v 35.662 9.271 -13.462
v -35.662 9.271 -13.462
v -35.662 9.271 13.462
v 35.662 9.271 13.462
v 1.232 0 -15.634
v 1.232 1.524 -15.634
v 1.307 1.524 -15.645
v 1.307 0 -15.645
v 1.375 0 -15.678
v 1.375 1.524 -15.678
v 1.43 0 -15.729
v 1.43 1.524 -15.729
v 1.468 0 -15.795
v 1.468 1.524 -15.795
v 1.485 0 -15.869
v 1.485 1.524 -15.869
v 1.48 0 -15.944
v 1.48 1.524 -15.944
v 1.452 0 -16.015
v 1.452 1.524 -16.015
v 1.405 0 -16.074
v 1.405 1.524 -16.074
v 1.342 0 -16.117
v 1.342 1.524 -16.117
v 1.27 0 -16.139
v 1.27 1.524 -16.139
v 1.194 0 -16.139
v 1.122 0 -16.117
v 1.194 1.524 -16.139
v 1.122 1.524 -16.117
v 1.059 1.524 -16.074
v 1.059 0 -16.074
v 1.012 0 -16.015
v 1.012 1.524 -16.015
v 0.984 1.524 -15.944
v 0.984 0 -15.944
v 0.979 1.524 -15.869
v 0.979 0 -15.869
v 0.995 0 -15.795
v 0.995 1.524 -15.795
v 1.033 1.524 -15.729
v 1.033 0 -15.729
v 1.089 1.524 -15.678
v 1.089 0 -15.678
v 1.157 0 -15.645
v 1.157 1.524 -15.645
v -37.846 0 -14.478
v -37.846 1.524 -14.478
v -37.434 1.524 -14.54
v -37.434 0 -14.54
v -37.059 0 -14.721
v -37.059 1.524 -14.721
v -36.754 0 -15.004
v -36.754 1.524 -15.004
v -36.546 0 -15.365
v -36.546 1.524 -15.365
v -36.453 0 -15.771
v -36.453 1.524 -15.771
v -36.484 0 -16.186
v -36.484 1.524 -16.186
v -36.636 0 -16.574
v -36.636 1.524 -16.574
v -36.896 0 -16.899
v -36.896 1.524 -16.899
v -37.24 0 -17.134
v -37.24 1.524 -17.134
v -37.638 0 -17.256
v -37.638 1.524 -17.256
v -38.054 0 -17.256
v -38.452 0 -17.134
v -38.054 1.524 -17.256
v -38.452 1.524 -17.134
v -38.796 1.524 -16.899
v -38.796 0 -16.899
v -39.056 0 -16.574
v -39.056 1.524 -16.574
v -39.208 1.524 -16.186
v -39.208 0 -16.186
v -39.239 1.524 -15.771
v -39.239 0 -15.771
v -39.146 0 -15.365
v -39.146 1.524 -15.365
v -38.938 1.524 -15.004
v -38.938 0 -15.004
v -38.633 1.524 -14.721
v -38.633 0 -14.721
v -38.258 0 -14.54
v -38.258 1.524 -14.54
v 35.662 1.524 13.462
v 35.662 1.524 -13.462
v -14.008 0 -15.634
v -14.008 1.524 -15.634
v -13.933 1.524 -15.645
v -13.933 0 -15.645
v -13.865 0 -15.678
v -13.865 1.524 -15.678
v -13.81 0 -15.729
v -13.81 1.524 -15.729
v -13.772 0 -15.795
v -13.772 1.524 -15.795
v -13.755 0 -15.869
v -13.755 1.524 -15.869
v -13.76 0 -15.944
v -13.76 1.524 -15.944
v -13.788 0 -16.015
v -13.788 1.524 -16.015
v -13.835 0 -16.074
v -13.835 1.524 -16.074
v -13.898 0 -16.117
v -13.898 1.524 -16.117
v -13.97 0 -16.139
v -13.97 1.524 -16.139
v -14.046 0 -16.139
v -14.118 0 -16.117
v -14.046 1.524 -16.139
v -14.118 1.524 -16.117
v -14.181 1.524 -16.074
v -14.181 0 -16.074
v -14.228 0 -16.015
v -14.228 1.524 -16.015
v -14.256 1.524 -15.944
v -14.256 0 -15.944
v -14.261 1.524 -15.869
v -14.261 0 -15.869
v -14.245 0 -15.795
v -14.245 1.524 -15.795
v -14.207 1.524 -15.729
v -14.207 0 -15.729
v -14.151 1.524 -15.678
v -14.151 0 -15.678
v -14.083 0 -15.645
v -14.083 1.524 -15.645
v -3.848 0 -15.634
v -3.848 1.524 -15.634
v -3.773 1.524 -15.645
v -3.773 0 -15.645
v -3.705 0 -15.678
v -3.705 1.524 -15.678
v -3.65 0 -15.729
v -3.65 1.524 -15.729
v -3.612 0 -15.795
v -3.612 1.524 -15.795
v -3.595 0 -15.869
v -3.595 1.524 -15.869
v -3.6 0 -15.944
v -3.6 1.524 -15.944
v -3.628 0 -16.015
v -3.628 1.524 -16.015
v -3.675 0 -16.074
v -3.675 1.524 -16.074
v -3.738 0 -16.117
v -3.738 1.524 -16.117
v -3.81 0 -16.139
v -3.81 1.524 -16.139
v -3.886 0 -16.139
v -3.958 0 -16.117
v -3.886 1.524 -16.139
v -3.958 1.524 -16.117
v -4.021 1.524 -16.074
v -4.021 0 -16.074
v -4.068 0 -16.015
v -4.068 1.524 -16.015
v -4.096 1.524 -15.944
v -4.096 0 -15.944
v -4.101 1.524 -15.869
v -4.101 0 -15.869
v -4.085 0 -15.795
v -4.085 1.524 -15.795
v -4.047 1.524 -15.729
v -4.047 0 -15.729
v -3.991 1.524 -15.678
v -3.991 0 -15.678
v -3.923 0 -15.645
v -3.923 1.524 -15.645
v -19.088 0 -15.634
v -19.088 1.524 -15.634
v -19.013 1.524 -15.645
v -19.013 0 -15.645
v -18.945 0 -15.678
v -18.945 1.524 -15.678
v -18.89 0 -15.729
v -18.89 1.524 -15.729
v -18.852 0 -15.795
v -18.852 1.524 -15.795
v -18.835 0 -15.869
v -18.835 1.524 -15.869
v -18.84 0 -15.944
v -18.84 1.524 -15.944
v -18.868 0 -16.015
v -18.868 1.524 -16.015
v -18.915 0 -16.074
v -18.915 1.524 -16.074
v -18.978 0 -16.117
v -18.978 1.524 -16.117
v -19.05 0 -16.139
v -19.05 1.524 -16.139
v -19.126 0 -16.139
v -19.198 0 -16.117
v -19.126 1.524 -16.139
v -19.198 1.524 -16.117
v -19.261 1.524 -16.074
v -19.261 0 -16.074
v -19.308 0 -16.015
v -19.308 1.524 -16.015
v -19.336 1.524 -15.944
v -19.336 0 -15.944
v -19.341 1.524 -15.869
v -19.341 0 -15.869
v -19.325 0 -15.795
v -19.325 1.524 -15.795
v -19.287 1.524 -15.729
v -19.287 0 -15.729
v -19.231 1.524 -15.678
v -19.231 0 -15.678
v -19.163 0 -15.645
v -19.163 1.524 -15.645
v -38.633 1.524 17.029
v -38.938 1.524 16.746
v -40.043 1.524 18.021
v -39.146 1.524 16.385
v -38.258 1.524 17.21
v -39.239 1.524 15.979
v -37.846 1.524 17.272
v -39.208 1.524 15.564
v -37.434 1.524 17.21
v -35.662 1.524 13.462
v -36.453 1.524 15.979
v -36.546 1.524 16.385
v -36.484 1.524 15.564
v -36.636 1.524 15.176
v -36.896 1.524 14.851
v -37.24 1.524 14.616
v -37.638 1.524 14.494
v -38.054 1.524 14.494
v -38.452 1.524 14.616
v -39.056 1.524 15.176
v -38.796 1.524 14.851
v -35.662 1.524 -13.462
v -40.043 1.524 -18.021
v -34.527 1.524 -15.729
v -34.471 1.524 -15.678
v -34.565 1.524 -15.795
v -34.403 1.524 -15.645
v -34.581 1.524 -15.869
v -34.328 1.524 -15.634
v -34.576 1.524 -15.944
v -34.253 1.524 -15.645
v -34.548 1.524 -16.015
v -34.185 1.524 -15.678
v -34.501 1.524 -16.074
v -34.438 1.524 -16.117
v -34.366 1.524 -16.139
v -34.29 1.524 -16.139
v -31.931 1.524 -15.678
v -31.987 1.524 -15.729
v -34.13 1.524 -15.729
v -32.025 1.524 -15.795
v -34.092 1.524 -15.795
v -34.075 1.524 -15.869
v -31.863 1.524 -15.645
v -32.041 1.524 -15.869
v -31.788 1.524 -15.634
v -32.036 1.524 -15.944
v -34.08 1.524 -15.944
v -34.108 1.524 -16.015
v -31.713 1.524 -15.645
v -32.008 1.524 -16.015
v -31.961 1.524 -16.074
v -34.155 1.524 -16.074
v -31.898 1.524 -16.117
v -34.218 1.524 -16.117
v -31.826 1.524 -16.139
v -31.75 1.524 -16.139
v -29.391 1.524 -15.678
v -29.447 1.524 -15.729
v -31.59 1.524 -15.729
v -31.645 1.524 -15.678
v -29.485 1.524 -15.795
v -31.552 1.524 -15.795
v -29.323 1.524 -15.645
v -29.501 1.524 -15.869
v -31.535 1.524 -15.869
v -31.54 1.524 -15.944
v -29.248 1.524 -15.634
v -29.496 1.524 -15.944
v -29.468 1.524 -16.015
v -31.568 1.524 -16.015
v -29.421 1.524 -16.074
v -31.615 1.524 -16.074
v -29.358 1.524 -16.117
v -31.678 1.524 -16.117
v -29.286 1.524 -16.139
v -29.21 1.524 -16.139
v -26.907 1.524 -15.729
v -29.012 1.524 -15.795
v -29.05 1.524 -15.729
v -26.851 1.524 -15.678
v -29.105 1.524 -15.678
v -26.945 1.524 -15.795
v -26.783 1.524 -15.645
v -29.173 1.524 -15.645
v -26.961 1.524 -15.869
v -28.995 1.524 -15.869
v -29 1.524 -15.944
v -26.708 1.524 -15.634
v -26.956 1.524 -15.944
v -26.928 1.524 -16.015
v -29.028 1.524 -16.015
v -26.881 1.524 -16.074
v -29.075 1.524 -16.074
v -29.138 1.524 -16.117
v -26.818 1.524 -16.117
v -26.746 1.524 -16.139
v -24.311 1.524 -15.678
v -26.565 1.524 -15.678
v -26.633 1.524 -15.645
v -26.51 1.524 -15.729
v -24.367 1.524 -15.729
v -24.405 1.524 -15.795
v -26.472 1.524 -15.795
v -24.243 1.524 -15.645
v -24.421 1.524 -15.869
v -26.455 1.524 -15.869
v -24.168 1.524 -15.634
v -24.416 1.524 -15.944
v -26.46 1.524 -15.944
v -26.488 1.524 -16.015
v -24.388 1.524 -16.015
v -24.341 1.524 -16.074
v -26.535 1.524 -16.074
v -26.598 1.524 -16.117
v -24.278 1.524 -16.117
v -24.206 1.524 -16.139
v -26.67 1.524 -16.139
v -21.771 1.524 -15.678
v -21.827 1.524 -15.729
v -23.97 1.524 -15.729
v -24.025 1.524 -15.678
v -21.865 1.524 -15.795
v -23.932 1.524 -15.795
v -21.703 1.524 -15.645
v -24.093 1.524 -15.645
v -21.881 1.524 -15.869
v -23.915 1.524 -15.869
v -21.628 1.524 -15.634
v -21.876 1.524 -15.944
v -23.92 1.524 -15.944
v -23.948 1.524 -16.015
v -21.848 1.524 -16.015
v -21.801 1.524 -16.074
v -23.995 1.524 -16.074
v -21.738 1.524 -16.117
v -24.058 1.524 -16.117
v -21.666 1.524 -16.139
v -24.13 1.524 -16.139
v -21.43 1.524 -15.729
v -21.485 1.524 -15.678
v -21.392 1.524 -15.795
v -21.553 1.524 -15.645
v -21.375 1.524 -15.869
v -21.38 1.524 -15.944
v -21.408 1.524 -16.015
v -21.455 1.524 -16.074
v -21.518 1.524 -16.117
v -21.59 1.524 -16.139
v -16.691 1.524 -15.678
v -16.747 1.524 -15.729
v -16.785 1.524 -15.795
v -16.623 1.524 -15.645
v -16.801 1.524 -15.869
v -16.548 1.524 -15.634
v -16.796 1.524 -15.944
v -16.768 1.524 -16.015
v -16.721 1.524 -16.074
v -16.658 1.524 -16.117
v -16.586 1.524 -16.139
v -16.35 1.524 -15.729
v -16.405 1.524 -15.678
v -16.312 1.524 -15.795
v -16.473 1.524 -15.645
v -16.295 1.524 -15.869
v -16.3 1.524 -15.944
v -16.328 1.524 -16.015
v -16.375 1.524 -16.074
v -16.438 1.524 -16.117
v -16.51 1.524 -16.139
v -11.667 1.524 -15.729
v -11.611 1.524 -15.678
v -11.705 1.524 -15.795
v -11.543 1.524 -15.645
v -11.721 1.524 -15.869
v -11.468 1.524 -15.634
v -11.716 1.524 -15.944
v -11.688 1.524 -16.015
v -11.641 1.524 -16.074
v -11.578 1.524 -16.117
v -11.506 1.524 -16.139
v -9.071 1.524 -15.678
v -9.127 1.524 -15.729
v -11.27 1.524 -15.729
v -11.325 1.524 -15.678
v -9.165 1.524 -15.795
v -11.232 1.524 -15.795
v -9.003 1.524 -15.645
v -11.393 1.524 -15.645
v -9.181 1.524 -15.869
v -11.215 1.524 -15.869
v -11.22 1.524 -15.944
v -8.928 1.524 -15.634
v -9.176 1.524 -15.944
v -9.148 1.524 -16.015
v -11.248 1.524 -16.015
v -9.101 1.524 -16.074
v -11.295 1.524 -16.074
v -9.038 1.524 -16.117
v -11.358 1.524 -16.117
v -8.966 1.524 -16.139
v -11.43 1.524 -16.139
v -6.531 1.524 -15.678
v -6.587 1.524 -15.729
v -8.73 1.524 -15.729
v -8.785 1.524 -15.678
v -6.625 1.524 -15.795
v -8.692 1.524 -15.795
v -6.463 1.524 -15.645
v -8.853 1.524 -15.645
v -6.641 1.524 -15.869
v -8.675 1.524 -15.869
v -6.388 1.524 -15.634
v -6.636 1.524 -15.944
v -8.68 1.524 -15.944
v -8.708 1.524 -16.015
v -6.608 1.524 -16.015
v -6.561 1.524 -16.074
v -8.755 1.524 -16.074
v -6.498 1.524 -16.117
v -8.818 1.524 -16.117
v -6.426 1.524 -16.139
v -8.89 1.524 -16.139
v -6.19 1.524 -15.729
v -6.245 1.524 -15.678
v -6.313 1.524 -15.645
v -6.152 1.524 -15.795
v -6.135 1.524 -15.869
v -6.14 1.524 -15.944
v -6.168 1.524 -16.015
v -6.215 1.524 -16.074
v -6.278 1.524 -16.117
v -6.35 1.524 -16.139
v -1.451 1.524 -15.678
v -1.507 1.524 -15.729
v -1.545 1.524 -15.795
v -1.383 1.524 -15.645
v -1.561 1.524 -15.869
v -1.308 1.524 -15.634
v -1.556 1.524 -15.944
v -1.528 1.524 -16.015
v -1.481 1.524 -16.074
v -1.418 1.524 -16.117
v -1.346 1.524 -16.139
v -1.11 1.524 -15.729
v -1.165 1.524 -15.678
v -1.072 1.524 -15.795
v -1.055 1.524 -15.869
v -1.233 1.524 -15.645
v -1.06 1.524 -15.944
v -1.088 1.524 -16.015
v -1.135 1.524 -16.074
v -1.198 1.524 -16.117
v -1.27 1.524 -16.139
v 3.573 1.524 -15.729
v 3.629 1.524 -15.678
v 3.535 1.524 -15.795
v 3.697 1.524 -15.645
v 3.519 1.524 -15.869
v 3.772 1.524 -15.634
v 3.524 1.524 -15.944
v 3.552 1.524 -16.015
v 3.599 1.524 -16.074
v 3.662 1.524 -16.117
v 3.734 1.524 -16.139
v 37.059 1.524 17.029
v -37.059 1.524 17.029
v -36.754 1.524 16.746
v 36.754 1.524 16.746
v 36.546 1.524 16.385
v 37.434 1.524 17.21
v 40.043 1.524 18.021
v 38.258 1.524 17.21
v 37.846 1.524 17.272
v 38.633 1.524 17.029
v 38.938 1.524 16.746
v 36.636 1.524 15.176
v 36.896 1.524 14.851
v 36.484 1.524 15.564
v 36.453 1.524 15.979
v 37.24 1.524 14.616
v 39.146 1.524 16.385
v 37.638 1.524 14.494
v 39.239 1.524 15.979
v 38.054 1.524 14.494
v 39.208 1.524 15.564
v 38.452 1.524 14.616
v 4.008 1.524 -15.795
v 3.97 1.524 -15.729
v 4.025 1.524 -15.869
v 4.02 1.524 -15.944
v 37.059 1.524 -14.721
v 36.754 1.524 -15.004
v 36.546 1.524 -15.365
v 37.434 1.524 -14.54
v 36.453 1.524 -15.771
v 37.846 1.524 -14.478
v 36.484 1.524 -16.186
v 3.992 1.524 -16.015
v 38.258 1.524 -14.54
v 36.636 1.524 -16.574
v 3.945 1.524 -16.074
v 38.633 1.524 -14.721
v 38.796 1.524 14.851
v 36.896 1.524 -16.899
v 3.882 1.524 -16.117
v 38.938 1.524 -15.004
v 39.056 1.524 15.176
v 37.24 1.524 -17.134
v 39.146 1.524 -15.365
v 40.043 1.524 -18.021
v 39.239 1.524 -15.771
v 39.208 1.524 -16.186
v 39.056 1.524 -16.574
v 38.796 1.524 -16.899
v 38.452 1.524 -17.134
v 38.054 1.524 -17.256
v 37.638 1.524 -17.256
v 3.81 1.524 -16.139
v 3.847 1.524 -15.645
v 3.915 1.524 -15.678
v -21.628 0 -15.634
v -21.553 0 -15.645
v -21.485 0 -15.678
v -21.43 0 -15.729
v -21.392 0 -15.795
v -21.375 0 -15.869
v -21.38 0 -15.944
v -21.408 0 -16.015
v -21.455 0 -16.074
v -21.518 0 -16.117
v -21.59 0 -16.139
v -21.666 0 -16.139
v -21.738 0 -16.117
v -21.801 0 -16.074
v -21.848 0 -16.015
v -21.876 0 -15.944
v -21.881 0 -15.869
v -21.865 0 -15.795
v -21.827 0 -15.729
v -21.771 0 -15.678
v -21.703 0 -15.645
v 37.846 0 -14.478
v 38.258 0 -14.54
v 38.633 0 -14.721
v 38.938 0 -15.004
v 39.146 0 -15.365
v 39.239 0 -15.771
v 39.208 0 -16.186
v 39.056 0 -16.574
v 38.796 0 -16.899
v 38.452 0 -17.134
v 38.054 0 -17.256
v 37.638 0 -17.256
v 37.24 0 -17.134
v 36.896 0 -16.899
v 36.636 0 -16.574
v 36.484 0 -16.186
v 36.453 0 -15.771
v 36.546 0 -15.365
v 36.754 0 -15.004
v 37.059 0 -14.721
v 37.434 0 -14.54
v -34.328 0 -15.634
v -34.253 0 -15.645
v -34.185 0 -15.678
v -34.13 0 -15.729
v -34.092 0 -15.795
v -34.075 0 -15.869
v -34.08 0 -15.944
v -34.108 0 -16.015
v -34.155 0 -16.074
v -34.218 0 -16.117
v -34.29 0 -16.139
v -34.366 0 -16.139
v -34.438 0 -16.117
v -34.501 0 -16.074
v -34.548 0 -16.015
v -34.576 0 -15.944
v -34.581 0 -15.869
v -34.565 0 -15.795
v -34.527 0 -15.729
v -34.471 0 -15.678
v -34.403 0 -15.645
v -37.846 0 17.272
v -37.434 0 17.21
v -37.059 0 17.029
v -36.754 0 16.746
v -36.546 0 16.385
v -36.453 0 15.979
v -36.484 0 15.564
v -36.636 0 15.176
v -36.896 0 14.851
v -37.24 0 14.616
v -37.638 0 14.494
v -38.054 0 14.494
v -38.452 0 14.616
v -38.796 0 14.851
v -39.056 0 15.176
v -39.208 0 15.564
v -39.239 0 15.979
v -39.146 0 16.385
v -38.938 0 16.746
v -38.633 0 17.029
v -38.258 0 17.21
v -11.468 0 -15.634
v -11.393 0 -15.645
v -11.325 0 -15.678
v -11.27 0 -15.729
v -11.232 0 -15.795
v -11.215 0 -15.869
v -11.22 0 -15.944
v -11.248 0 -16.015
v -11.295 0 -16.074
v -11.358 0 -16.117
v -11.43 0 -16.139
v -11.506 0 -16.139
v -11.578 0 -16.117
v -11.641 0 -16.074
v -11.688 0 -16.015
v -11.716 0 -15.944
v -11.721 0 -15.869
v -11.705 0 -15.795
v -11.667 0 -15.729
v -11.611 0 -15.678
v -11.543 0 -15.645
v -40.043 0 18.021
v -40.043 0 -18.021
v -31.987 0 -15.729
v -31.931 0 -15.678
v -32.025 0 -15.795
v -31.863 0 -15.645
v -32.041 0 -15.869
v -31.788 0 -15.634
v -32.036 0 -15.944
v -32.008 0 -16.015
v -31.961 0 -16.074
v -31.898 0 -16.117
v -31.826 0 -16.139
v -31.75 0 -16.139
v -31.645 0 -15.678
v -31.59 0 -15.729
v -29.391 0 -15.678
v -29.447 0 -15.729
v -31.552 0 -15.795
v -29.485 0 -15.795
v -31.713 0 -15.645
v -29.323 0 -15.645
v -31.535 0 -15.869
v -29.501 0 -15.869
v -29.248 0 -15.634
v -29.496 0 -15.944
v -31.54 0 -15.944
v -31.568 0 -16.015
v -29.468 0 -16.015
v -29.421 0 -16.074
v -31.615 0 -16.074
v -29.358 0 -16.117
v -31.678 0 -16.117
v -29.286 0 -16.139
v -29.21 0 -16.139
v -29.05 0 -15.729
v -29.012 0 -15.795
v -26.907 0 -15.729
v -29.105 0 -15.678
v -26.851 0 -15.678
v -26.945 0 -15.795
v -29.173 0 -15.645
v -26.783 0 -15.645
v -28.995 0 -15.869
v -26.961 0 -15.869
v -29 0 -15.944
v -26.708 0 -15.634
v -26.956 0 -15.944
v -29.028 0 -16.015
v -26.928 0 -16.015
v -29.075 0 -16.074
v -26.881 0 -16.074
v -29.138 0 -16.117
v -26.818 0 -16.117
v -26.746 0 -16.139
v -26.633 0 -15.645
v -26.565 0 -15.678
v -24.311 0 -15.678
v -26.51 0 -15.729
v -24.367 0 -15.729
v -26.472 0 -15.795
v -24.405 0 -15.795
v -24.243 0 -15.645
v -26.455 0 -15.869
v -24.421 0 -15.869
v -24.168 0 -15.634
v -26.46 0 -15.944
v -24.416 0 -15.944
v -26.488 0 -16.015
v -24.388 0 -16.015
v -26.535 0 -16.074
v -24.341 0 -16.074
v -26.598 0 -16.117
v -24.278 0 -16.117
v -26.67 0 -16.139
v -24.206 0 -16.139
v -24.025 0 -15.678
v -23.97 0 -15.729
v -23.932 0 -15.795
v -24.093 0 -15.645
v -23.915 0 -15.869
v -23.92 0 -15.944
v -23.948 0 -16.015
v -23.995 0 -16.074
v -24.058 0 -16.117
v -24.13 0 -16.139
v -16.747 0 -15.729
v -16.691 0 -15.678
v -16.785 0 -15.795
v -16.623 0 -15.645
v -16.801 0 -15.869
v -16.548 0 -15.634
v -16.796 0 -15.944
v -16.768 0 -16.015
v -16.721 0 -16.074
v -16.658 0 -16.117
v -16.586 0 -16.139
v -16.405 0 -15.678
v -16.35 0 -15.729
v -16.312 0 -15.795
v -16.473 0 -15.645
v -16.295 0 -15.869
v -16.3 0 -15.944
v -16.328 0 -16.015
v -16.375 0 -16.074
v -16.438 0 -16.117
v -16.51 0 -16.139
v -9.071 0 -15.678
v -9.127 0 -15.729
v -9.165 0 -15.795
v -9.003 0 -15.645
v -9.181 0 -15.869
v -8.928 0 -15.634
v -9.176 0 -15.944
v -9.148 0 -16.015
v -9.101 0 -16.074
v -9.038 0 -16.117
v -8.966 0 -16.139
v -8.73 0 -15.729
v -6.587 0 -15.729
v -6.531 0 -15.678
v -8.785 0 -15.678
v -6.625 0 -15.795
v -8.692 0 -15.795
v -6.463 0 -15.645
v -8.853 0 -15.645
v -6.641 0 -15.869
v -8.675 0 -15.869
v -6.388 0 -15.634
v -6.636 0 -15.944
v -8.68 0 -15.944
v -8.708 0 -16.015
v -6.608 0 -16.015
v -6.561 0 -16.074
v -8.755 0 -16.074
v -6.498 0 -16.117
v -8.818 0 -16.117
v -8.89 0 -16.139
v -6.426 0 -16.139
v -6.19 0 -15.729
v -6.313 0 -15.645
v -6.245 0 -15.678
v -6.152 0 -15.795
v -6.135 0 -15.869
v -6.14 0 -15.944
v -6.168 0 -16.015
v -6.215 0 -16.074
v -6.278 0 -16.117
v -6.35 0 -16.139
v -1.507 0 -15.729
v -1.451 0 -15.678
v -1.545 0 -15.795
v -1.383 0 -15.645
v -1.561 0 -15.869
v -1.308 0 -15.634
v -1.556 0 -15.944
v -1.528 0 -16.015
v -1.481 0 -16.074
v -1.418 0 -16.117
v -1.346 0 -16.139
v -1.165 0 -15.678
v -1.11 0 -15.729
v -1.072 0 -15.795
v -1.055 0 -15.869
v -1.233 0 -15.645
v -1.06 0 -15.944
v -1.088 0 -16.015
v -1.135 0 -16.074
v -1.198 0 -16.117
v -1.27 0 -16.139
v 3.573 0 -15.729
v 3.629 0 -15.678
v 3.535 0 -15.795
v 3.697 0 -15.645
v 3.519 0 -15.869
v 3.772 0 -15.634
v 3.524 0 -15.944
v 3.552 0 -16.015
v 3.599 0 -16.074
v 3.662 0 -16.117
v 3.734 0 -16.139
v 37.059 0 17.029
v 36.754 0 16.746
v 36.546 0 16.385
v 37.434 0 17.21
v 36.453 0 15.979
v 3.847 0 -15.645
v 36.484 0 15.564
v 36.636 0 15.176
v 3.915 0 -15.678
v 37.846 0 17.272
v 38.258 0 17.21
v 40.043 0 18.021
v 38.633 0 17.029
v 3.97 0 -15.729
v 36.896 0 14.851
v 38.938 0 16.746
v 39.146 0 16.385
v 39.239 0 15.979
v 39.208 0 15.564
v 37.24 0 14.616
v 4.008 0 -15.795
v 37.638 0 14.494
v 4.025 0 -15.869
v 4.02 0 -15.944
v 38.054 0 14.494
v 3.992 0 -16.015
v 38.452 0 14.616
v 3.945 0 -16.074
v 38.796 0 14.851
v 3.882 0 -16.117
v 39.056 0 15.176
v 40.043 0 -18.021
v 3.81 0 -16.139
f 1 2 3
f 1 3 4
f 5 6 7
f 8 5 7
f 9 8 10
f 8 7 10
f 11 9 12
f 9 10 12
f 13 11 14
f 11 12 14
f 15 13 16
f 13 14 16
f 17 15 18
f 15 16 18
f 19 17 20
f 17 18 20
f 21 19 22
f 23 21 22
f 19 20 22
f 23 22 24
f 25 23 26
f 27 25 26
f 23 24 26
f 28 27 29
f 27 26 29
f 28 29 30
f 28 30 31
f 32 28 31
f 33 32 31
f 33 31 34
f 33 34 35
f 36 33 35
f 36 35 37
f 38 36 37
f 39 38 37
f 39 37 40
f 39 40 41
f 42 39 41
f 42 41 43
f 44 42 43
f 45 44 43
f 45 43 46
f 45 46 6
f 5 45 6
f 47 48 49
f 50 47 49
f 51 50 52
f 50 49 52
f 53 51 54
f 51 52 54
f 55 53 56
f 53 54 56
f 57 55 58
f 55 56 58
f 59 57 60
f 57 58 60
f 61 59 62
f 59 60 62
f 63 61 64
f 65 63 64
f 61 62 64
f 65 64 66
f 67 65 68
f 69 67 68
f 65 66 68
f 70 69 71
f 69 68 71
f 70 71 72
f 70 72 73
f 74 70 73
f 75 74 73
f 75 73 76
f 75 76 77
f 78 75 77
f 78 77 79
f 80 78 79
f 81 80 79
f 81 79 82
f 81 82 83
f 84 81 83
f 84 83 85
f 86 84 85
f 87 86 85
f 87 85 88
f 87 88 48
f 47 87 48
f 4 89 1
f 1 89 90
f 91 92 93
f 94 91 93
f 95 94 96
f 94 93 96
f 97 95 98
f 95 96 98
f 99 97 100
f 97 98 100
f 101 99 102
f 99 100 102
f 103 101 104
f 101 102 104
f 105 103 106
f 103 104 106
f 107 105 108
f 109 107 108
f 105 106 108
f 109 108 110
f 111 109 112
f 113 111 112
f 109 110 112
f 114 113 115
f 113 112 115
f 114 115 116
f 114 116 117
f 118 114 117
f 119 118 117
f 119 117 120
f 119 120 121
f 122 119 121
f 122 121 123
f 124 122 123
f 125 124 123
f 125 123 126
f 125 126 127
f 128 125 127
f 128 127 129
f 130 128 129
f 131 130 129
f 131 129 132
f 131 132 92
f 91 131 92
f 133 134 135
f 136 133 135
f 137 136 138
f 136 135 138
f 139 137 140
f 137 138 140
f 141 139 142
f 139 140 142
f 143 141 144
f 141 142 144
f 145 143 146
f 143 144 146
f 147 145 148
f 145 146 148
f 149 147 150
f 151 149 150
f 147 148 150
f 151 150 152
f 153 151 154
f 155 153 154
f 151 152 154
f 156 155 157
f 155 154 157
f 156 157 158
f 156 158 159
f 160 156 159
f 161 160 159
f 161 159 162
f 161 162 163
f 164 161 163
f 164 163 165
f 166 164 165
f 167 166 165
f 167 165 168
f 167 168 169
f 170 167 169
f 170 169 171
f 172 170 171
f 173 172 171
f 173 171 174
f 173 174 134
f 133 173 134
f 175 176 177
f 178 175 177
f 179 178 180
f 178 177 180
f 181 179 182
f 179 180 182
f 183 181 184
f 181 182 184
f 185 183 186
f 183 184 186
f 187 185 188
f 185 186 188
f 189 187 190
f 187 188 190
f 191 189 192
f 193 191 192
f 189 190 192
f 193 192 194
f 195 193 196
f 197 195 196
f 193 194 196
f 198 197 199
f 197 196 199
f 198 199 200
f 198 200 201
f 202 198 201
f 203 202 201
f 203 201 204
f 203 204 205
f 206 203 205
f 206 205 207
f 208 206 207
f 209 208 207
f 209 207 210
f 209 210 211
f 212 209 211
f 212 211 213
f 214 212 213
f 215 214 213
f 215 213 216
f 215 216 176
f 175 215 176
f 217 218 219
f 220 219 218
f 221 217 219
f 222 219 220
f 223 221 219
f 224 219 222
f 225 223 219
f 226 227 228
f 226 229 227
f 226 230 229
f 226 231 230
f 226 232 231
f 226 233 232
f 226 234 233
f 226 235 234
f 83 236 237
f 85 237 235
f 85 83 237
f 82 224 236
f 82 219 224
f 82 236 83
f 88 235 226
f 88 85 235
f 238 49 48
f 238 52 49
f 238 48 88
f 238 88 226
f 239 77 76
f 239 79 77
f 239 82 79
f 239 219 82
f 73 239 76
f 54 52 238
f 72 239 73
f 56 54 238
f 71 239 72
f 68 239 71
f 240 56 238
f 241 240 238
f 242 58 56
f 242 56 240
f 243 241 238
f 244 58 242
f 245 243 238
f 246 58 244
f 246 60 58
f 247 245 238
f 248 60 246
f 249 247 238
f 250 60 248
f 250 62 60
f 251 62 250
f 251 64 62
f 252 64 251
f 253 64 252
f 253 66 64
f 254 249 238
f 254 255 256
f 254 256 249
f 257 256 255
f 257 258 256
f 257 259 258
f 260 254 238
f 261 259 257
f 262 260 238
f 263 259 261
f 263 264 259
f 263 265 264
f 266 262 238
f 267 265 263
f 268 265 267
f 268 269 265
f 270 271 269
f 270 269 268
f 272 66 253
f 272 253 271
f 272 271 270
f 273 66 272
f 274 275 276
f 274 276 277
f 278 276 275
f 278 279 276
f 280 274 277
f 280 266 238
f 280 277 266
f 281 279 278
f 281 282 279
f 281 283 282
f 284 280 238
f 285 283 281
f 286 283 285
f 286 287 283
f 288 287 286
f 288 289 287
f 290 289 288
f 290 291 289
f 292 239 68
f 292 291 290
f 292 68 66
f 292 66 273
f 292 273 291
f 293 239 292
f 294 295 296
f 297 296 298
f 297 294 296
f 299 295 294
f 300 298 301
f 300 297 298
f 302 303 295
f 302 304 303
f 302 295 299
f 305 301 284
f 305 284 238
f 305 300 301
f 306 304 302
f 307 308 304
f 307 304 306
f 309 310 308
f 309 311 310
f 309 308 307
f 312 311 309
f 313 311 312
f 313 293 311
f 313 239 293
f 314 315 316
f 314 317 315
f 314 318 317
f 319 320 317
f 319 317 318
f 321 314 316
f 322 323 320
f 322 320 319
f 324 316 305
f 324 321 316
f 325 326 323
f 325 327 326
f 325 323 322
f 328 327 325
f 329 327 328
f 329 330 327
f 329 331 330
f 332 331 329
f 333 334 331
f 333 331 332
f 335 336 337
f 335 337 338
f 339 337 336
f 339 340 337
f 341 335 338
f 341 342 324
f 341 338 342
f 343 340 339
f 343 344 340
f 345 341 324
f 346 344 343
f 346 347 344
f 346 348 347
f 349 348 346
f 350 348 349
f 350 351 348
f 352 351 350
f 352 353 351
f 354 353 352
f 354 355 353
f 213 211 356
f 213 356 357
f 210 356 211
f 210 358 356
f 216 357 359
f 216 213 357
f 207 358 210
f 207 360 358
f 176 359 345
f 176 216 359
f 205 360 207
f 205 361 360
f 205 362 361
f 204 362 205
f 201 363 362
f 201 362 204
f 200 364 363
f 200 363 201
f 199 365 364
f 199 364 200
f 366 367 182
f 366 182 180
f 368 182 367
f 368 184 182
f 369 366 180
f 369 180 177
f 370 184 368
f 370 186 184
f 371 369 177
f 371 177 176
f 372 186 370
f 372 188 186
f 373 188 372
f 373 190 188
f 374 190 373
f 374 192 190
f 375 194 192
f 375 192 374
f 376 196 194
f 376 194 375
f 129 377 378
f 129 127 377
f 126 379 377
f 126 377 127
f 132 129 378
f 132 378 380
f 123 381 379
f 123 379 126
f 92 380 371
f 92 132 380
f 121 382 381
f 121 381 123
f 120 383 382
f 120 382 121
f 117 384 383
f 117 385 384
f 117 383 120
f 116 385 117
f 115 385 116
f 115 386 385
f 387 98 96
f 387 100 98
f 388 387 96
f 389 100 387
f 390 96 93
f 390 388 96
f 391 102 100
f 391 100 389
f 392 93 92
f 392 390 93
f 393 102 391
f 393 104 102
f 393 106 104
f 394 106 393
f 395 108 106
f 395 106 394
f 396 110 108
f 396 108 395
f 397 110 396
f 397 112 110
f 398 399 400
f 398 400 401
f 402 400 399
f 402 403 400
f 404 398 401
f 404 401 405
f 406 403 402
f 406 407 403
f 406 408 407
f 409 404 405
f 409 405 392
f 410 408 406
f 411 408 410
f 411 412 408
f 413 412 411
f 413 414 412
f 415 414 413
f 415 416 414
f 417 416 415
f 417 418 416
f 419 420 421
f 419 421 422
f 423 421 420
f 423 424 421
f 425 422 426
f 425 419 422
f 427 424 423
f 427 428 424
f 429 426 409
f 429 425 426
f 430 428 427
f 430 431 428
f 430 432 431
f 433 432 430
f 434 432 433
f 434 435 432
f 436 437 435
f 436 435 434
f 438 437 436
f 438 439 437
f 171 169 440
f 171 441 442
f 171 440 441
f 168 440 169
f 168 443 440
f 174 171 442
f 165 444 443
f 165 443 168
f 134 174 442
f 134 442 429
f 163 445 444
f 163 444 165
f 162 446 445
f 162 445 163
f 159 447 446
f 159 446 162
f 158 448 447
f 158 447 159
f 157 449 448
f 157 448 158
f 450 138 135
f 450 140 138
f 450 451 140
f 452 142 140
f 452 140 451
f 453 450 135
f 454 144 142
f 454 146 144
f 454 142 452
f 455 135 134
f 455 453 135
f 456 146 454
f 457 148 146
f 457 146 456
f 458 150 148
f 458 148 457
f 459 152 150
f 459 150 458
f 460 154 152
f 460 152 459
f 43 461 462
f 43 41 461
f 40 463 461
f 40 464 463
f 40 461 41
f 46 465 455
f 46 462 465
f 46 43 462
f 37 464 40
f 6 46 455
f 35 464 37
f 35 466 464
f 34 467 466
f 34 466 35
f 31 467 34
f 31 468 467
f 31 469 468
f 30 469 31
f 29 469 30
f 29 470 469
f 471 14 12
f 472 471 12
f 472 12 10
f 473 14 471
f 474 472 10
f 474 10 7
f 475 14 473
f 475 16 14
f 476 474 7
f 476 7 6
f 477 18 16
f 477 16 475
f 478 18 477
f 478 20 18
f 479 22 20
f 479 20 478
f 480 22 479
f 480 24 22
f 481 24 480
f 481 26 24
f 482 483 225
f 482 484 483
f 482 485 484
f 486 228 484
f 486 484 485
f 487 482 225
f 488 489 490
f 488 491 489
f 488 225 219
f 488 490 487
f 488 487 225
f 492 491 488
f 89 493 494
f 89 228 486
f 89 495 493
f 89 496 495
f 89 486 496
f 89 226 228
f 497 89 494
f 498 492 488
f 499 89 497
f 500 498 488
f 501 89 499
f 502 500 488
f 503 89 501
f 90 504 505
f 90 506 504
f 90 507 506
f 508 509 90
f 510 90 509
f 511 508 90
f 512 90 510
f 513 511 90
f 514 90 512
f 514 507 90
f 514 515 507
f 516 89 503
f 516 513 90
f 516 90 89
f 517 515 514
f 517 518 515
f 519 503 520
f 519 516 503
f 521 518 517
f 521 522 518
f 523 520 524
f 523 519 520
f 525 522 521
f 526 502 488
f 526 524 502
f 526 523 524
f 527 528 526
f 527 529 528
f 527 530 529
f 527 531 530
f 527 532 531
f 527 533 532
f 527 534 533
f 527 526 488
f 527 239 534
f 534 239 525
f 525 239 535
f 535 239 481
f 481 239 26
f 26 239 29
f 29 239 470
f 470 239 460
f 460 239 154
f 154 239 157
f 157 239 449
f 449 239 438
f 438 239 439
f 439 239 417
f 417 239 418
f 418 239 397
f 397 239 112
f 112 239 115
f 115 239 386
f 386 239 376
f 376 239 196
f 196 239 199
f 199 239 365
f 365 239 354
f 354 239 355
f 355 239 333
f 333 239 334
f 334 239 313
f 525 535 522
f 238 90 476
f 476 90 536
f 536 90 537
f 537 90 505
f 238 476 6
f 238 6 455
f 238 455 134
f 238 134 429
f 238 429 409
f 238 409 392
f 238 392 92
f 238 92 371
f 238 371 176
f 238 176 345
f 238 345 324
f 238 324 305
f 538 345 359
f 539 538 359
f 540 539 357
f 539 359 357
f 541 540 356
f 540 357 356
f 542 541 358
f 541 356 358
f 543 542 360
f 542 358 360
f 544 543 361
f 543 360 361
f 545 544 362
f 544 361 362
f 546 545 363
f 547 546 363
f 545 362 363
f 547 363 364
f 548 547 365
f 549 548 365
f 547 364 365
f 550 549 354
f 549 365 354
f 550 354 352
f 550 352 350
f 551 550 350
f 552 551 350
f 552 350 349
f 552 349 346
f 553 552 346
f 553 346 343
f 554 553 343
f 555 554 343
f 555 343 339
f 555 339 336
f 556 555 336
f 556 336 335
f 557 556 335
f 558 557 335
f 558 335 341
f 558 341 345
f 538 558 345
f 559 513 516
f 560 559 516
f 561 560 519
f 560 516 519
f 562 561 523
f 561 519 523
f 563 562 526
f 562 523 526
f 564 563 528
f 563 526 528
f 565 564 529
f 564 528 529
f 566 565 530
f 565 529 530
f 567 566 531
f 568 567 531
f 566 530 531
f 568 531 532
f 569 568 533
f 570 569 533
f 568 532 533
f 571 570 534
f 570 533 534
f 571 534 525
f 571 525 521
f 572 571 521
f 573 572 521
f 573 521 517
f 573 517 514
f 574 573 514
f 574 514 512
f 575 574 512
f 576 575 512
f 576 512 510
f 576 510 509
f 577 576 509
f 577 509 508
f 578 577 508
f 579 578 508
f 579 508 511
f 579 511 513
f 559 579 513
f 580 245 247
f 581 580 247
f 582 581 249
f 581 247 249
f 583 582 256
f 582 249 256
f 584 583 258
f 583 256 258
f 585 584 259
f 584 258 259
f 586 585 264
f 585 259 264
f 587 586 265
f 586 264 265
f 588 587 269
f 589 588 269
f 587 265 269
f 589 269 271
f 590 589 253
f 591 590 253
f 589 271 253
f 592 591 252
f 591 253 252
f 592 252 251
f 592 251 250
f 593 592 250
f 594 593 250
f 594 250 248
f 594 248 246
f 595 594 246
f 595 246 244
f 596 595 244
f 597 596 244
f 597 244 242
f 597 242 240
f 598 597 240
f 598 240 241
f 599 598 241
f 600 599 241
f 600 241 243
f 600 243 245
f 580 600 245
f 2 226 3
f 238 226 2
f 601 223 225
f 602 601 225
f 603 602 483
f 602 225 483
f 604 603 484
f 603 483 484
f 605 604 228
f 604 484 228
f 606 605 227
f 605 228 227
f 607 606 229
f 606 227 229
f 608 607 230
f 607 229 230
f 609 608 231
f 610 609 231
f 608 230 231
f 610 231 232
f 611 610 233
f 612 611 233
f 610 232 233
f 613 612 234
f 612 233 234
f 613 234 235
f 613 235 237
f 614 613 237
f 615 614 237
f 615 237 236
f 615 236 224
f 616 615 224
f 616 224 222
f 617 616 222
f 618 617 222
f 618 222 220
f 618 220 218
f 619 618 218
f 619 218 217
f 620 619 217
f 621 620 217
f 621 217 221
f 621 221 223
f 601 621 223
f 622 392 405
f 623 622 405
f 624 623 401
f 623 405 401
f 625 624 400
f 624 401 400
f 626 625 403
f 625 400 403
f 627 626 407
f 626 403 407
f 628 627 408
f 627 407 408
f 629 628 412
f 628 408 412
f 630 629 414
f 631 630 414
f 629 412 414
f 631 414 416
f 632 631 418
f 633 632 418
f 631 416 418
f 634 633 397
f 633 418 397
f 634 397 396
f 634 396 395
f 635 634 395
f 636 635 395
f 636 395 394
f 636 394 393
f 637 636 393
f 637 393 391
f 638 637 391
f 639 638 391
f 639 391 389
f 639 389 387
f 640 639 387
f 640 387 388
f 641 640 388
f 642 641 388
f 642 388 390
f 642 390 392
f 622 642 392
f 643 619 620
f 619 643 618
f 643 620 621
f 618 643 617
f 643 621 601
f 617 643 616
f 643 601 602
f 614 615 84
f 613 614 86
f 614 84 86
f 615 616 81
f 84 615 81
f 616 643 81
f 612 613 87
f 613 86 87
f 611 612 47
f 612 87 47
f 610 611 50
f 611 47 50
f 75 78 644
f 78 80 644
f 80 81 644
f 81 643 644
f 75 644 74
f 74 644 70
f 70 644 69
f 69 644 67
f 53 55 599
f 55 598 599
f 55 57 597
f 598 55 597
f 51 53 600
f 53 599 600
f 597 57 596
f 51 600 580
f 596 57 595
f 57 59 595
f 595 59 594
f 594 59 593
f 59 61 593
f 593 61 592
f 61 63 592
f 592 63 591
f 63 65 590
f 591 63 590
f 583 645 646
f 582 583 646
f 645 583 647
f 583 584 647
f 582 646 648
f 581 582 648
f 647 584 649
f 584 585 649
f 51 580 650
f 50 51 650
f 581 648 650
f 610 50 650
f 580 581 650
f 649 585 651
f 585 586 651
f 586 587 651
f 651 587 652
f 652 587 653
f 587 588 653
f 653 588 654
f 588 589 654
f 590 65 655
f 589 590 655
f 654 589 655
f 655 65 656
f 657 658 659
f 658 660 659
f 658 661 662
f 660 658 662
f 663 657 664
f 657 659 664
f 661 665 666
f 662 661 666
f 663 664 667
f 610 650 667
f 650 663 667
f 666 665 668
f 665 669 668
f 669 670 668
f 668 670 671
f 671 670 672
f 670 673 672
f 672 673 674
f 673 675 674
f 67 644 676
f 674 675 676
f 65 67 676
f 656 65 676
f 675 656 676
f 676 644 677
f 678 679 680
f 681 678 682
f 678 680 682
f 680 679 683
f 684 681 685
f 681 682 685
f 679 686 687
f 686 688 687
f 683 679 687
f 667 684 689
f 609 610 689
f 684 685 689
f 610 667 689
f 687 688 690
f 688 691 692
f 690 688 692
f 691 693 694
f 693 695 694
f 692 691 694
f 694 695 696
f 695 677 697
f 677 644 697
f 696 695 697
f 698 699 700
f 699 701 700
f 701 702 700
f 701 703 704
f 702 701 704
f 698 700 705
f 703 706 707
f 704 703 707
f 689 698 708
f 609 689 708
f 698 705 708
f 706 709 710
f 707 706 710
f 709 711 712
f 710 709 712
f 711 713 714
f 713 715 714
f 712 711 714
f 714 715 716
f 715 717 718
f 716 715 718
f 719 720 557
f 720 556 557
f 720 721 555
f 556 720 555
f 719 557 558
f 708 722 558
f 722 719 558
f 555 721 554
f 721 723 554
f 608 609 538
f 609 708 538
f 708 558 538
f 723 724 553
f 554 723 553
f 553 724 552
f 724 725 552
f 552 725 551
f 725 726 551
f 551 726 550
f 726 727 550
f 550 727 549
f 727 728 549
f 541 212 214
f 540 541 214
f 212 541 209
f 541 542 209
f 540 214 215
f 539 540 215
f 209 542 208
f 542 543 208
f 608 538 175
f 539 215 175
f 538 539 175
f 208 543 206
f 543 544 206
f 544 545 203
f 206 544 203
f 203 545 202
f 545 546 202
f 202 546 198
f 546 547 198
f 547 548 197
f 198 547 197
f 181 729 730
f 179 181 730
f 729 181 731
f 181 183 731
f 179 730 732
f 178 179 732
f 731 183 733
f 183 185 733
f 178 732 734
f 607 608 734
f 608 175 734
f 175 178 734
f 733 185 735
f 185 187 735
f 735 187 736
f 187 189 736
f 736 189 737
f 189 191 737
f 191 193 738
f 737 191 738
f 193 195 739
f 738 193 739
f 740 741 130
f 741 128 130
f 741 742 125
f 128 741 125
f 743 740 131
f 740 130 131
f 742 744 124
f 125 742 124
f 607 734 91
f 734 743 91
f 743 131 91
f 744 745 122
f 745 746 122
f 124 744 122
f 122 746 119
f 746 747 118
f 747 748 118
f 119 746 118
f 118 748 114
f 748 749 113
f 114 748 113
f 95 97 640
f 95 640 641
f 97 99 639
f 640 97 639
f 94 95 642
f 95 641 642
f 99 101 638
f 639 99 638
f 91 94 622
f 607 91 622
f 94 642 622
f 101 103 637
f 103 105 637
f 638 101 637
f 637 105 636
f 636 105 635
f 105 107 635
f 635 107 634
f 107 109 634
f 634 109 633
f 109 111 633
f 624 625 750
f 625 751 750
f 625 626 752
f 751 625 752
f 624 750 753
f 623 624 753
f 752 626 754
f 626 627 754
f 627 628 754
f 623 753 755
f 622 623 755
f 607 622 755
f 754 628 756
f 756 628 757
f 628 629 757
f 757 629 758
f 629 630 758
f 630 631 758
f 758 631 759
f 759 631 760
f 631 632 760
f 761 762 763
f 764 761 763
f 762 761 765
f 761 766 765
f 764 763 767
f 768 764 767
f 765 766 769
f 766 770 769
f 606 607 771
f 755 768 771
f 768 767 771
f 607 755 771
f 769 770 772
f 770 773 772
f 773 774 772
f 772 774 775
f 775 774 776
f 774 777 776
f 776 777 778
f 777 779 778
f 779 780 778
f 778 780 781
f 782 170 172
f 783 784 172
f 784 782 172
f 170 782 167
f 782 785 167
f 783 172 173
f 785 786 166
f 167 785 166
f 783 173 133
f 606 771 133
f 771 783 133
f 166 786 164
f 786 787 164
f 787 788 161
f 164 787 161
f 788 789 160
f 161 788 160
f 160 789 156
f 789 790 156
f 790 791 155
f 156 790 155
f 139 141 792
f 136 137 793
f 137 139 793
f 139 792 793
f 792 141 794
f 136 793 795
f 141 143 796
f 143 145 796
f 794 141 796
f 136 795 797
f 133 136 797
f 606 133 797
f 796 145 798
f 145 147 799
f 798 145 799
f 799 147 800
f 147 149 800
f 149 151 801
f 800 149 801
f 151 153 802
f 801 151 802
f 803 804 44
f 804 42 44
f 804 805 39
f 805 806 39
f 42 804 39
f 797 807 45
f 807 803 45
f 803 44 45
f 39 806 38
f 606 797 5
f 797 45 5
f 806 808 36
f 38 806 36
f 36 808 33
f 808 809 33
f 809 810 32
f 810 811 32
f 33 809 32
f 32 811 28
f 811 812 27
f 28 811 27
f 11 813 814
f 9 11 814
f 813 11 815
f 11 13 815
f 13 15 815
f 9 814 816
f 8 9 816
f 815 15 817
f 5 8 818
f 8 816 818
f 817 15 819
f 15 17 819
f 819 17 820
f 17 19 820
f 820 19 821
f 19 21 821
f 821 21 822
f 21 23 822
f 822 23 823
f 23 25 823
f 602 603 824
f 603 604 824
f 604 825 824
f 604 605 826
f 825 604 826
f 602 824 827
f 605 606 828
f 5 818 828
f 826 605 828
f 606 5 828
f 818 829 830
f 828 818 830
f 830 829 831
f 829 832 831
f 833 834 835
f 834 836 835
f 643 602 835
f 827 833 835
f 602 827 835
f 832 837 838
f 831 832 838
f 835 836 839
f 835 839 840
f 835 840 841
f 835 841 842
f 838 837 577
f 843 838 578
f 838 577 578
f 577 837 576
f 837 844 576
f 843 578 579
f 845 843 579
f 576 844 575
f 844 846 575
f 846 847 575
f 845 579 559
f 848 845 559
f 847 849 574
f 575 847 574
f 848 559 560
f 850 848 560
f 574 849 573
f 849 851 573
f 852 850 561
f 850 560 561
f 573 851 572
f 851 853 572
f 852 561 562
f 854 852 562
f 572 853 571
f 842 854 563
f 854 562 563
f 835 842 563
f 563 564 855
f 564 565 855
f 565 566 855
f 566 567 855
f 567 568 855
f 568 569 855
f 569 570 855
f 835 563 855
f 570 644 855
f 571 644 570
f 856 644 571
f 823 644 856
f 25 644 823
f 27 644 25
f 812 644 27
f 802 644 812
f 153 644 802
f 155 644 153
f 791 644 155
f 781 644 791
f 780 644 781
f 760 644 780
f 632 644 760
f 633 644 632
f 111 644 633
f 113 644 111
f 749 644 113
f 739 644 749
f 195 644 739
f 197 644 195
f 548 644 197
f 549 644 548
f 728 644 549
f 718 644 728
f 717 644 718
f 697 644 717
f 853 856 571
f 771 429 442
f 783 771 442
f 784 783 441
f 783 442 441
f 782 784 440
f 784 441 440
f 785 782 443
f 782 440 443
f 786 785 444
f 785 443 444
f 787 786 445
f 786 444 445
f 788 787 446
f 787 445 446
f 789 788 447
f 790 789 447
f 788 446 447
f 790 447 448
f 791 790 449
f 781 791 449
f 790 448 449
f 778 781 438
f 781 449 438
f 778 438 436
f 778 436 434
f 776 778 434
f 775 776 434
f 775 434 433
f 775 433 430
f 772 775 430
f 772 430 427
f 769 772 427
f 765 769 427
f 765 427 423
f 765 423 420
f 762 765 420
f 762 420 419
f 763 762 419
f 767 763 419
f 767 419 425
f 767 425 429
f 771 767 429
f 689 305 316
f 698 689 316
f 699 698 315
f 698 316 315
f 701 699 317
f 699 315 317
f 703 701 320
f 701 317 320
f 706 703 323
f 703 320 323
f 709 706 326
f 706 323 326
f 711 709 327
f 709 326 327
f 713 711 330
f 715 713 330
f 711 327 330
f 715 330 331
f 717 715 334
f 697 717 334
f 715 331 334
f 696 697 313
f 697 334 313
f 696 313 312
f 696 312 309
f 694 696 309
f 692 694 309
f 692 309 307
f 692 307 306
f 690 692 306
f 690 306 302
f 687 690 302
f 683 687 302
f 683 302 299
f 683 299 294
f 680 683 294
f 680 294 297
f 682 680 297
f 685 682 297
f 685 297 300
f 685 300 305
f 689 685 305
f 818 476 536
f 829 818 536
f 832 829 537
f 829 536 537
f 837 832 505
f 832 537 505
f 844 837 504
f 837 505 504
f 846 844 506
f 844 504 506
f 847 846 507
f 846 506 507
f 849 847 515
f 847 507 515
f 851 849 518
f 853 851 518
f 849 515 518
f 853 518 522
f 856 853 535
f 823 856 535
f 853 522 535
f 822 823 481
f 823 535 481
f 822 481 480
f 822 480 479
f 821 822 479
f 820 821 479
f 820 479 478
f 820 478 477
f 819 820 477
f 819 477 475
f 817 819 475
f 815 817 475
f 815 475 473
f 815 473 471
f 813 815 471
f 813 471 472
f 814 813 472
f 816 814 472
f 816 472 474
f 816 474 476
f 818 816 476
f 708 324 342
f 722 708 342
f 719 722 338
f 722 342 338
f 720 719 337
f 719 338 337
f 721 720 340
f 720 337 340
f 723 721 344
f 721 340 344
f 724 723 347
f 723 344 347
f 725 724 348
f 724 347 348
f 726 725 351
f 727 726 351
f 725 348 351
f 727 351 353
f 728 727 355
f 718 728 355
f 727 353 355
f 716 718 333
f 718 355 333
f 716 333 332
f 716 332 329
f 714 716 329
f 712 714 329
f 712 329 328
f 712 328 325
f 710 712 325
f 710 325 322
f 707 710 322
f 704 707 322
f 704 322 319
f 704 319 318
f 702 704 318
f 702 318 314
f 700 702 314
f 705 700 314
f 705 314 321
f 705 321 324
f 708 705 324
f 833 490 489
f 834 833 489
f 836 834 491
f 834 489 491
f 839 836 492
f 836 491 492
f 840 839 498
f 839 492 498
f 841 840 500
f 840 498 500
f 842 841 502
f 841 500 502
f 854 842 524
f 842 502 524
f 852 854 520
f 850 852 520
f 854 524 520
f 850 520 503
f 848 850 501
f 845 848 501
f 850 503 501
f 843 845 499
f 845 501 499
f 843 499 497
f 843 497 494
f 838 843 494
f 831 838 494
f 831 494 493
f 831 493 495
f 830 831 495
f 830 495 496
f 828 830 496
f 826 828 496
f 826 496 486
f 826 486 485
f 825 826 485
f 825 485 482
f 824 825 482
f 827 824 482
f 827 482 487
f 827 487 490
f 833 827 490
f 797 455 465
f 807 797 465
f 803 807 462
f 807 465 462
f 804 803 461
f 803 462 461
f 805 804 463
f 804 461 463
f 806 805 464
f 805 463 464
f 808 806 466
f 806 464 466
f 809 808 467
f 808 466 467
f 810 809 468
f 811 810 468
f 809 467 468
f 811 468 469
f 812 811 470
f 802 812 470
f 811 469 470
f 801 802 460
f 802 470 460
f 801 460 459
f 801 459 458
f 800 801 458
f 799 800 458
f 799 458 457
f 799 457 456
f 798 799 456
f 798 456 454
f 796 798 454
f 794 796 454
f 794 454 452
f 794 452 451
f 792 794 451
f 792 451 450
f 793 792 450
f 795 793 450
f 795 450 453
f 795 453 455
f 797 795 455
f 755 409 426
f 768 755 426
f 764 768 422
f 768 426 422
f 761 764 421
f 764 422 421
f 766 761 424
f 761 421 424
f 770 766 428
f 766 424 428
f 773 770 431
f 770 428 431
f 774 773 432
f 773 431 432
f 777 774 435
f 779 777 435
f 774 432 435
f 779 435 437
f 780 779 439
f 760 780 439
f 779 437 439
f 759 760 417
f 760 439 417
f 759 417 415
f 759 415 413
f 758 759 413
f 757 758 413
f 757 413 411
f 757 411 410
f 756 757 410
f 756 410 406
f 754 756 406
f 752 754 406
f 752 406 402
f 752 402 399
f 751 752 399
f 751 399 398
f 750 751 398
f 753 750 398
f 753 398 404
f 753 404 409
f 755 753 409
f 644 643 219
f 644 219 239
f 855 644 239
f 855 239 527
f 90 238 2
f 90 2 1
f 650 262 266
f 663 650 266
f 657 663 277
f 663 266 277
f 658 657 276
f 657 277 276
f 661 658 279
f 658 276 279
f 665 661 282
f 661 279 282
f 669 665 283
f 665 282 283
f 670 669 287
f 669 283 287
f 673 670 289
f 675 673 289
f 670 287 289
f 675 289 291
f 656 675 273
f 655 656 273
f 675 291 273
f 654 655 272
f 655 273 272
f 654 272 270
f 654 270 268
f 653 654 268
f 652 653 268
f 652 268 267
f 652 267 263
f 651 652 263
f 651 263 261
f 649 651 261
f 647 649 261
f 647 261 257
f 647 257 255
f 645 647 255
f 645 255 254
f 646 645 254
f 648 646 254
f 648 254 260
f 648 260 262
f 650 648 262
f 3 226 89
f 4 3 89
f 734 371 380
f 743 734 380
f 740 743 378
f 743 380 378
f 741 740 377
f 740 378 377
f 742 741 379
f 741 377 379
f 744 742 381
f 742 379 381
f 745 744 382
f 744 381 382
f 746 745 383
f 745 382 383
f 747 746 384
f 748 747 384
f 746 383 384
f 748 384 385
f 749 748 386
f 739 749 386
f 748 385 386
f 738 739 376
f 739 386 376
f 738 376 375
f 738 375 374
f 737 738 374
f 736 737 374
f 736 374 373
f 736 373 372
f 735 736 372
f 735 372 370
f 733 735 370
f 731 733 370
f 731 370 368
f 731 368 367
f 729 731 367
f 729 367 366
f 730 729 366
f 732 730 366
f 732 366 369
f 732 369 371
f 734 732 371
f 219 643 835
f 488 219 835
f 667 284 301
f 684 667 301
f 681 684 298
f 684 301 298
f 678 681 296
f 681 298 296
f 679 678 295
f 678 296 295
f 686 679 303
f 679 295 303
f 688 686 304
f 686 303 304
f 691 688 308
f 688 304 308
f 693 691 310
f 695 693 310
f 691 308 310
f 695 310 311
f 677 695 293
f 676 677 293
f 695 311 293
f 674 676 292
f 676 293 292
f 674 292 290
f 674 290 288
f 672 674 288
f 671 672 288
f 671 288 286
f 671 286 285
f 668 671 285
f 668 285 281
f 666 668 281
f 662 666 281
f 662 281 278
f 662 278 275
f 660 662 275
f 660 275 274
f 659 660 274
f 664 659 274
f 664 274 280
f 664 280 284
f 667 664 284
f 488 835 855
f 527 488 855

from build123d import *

# Parameters (mm, degrees)
SKETCH1_W      = 80.0862
SKETCH1_H      = 36.0426
EXTRUDE1_DEPTH = 1.524
SKETCH2_W      = 71.3232
SKETCH2_H      = 26.924
EXTRUDE2_DEPTH = 7.747
SKETCH3_R      = 1.397
EXTRUDE3_DEPTH = 45.589607761
SKETCH4_R      = 0.254
EXTRUDE4_DEPTH = 45.589607761


with BuildPart() as part:
    # Sketch1 → Extrude1 (new body)
    with BuildSketch(Plane(origin=(0, 0, 0), x_dir=(1, 0, 0), z_dir=(0, 1, 0))):
        Rectangle(SKETCH1_W, SKETCH1_H)
    extrude(amount=EXTRUDE1_DEPTH)

    # Sketch2 → Extrude2 (add)
    with BuildSketch(Plane(origin=(0, 1.524, 0), x_dir=(1, 0, 0), z_dir=(0, 1, 0))):
        Rectangle(SKETCH2_W, SKETCH2_H)
    extrude(amount=EXTRUDE2_DEPTH)

    # Sketch3 → Extrude3 (cut, through all)
    with BuildSketch(Plane(origin=(0, 1.524, 0), x_dir=(1, 0, 0), z_dir=(0, 1, 0))):
        with Locations(Location((-37.846, 15.875, 0), (0, 0, 270))):
            Circle(SKETCH3_R)
        with Locations(Location((37.846, 15.875, 0), (0, 0, 270))):
            Circle(SKETCH3_R)
        with Locations(Location((37.846, -15.875, 0), (0, 0, 270))):
            Circle(SKETCH3_R)
        with Locations(Location((-37.846, -15.875, 0), (0, 0, 270))):
            Circle(SKETCH3_R)
    extrude(amount=-EXTRUDE3_DEPTH, mode=Mode.SUBTRACT)

    # Sketch4 → Extrude4 (cut, through all)
    with BuildSketch(Plane(origin=(0, 1.524, 0), x_dir=(1, 0, 0), z_dir=(0, 1, 0))):
        with Locations(Location((-34.3281, 15.8877, 0), (0, 0, 270))):
            Circle(SKETCH4_R)
        with Locations(Location((-31.7881, 15.8877, 0), (0, 0, 270))):
            Circle(SKETCH4_R)
        with Locations(Location((-29.2481, 15.8877, 0), (0, 0, 270))):
            Circle(SKETCH4_R)
        with Locations(Location((-26.7081, 15.8877, 0), (0, 0, 270))):
            Circle(SKETCH4_R)
        with Locations(Location((-24.1681, 15.8877, 0), (0, 0, 270))):
            Circle(SKETCH4_R)
        with Locations(Location((-21.6281, 15.8877, 0), (0, 0, 270))):
            Circle(SKETCH4_R)
        with Locations(Location((-19.0881, 15.8877, 0), (0, 0, 270))):
            Circle(SKETCH4_R)
        with Locations(Location((-16.5481, 15.8877, 0), (0, 0, 270))):
            Circle(SKETCH4_R)
        with Locations(Location((-14.0081, 15.8877, 0), (0, 0, 270))):
            Circle(SKETCH4_R)
        with Locations(Location((-11.4681, 15.8877, 0), (0, 0, 270))):
            Circle(SKETCH4_R)
        with Locations(Location((-8.9281, 15.8877, 0), (0, 0, 270))):
            Circle(SKETCH4_R)
        with Locations(Location((-6.3881, 15.8877, 0), (0, 0, 270))):
            Circle(SKETCH4_R)
        with Locations(Location((-3.8481, 15.8877, 0), (0, 0, 270))):
            Circle(SKETCH4_R)
        with Locations(Location((-1.3081, 15.8877, 0), (0, 0, 270))):
            Circle(SKETCH4_R)
        with Locations(Location((1.2319, 15.8877, 0), (0, 0, 270))):
            Circle(SKETCH4_R)
        with Locations(Location((3.7719, 15.8877, 0), (0, 0, 270))):
            Circle(SKETCH4_R)
    extrude(amount=-EXTRUDE4_DEPTH, mode=Mode.SUBTRACT)


solid = part.part
